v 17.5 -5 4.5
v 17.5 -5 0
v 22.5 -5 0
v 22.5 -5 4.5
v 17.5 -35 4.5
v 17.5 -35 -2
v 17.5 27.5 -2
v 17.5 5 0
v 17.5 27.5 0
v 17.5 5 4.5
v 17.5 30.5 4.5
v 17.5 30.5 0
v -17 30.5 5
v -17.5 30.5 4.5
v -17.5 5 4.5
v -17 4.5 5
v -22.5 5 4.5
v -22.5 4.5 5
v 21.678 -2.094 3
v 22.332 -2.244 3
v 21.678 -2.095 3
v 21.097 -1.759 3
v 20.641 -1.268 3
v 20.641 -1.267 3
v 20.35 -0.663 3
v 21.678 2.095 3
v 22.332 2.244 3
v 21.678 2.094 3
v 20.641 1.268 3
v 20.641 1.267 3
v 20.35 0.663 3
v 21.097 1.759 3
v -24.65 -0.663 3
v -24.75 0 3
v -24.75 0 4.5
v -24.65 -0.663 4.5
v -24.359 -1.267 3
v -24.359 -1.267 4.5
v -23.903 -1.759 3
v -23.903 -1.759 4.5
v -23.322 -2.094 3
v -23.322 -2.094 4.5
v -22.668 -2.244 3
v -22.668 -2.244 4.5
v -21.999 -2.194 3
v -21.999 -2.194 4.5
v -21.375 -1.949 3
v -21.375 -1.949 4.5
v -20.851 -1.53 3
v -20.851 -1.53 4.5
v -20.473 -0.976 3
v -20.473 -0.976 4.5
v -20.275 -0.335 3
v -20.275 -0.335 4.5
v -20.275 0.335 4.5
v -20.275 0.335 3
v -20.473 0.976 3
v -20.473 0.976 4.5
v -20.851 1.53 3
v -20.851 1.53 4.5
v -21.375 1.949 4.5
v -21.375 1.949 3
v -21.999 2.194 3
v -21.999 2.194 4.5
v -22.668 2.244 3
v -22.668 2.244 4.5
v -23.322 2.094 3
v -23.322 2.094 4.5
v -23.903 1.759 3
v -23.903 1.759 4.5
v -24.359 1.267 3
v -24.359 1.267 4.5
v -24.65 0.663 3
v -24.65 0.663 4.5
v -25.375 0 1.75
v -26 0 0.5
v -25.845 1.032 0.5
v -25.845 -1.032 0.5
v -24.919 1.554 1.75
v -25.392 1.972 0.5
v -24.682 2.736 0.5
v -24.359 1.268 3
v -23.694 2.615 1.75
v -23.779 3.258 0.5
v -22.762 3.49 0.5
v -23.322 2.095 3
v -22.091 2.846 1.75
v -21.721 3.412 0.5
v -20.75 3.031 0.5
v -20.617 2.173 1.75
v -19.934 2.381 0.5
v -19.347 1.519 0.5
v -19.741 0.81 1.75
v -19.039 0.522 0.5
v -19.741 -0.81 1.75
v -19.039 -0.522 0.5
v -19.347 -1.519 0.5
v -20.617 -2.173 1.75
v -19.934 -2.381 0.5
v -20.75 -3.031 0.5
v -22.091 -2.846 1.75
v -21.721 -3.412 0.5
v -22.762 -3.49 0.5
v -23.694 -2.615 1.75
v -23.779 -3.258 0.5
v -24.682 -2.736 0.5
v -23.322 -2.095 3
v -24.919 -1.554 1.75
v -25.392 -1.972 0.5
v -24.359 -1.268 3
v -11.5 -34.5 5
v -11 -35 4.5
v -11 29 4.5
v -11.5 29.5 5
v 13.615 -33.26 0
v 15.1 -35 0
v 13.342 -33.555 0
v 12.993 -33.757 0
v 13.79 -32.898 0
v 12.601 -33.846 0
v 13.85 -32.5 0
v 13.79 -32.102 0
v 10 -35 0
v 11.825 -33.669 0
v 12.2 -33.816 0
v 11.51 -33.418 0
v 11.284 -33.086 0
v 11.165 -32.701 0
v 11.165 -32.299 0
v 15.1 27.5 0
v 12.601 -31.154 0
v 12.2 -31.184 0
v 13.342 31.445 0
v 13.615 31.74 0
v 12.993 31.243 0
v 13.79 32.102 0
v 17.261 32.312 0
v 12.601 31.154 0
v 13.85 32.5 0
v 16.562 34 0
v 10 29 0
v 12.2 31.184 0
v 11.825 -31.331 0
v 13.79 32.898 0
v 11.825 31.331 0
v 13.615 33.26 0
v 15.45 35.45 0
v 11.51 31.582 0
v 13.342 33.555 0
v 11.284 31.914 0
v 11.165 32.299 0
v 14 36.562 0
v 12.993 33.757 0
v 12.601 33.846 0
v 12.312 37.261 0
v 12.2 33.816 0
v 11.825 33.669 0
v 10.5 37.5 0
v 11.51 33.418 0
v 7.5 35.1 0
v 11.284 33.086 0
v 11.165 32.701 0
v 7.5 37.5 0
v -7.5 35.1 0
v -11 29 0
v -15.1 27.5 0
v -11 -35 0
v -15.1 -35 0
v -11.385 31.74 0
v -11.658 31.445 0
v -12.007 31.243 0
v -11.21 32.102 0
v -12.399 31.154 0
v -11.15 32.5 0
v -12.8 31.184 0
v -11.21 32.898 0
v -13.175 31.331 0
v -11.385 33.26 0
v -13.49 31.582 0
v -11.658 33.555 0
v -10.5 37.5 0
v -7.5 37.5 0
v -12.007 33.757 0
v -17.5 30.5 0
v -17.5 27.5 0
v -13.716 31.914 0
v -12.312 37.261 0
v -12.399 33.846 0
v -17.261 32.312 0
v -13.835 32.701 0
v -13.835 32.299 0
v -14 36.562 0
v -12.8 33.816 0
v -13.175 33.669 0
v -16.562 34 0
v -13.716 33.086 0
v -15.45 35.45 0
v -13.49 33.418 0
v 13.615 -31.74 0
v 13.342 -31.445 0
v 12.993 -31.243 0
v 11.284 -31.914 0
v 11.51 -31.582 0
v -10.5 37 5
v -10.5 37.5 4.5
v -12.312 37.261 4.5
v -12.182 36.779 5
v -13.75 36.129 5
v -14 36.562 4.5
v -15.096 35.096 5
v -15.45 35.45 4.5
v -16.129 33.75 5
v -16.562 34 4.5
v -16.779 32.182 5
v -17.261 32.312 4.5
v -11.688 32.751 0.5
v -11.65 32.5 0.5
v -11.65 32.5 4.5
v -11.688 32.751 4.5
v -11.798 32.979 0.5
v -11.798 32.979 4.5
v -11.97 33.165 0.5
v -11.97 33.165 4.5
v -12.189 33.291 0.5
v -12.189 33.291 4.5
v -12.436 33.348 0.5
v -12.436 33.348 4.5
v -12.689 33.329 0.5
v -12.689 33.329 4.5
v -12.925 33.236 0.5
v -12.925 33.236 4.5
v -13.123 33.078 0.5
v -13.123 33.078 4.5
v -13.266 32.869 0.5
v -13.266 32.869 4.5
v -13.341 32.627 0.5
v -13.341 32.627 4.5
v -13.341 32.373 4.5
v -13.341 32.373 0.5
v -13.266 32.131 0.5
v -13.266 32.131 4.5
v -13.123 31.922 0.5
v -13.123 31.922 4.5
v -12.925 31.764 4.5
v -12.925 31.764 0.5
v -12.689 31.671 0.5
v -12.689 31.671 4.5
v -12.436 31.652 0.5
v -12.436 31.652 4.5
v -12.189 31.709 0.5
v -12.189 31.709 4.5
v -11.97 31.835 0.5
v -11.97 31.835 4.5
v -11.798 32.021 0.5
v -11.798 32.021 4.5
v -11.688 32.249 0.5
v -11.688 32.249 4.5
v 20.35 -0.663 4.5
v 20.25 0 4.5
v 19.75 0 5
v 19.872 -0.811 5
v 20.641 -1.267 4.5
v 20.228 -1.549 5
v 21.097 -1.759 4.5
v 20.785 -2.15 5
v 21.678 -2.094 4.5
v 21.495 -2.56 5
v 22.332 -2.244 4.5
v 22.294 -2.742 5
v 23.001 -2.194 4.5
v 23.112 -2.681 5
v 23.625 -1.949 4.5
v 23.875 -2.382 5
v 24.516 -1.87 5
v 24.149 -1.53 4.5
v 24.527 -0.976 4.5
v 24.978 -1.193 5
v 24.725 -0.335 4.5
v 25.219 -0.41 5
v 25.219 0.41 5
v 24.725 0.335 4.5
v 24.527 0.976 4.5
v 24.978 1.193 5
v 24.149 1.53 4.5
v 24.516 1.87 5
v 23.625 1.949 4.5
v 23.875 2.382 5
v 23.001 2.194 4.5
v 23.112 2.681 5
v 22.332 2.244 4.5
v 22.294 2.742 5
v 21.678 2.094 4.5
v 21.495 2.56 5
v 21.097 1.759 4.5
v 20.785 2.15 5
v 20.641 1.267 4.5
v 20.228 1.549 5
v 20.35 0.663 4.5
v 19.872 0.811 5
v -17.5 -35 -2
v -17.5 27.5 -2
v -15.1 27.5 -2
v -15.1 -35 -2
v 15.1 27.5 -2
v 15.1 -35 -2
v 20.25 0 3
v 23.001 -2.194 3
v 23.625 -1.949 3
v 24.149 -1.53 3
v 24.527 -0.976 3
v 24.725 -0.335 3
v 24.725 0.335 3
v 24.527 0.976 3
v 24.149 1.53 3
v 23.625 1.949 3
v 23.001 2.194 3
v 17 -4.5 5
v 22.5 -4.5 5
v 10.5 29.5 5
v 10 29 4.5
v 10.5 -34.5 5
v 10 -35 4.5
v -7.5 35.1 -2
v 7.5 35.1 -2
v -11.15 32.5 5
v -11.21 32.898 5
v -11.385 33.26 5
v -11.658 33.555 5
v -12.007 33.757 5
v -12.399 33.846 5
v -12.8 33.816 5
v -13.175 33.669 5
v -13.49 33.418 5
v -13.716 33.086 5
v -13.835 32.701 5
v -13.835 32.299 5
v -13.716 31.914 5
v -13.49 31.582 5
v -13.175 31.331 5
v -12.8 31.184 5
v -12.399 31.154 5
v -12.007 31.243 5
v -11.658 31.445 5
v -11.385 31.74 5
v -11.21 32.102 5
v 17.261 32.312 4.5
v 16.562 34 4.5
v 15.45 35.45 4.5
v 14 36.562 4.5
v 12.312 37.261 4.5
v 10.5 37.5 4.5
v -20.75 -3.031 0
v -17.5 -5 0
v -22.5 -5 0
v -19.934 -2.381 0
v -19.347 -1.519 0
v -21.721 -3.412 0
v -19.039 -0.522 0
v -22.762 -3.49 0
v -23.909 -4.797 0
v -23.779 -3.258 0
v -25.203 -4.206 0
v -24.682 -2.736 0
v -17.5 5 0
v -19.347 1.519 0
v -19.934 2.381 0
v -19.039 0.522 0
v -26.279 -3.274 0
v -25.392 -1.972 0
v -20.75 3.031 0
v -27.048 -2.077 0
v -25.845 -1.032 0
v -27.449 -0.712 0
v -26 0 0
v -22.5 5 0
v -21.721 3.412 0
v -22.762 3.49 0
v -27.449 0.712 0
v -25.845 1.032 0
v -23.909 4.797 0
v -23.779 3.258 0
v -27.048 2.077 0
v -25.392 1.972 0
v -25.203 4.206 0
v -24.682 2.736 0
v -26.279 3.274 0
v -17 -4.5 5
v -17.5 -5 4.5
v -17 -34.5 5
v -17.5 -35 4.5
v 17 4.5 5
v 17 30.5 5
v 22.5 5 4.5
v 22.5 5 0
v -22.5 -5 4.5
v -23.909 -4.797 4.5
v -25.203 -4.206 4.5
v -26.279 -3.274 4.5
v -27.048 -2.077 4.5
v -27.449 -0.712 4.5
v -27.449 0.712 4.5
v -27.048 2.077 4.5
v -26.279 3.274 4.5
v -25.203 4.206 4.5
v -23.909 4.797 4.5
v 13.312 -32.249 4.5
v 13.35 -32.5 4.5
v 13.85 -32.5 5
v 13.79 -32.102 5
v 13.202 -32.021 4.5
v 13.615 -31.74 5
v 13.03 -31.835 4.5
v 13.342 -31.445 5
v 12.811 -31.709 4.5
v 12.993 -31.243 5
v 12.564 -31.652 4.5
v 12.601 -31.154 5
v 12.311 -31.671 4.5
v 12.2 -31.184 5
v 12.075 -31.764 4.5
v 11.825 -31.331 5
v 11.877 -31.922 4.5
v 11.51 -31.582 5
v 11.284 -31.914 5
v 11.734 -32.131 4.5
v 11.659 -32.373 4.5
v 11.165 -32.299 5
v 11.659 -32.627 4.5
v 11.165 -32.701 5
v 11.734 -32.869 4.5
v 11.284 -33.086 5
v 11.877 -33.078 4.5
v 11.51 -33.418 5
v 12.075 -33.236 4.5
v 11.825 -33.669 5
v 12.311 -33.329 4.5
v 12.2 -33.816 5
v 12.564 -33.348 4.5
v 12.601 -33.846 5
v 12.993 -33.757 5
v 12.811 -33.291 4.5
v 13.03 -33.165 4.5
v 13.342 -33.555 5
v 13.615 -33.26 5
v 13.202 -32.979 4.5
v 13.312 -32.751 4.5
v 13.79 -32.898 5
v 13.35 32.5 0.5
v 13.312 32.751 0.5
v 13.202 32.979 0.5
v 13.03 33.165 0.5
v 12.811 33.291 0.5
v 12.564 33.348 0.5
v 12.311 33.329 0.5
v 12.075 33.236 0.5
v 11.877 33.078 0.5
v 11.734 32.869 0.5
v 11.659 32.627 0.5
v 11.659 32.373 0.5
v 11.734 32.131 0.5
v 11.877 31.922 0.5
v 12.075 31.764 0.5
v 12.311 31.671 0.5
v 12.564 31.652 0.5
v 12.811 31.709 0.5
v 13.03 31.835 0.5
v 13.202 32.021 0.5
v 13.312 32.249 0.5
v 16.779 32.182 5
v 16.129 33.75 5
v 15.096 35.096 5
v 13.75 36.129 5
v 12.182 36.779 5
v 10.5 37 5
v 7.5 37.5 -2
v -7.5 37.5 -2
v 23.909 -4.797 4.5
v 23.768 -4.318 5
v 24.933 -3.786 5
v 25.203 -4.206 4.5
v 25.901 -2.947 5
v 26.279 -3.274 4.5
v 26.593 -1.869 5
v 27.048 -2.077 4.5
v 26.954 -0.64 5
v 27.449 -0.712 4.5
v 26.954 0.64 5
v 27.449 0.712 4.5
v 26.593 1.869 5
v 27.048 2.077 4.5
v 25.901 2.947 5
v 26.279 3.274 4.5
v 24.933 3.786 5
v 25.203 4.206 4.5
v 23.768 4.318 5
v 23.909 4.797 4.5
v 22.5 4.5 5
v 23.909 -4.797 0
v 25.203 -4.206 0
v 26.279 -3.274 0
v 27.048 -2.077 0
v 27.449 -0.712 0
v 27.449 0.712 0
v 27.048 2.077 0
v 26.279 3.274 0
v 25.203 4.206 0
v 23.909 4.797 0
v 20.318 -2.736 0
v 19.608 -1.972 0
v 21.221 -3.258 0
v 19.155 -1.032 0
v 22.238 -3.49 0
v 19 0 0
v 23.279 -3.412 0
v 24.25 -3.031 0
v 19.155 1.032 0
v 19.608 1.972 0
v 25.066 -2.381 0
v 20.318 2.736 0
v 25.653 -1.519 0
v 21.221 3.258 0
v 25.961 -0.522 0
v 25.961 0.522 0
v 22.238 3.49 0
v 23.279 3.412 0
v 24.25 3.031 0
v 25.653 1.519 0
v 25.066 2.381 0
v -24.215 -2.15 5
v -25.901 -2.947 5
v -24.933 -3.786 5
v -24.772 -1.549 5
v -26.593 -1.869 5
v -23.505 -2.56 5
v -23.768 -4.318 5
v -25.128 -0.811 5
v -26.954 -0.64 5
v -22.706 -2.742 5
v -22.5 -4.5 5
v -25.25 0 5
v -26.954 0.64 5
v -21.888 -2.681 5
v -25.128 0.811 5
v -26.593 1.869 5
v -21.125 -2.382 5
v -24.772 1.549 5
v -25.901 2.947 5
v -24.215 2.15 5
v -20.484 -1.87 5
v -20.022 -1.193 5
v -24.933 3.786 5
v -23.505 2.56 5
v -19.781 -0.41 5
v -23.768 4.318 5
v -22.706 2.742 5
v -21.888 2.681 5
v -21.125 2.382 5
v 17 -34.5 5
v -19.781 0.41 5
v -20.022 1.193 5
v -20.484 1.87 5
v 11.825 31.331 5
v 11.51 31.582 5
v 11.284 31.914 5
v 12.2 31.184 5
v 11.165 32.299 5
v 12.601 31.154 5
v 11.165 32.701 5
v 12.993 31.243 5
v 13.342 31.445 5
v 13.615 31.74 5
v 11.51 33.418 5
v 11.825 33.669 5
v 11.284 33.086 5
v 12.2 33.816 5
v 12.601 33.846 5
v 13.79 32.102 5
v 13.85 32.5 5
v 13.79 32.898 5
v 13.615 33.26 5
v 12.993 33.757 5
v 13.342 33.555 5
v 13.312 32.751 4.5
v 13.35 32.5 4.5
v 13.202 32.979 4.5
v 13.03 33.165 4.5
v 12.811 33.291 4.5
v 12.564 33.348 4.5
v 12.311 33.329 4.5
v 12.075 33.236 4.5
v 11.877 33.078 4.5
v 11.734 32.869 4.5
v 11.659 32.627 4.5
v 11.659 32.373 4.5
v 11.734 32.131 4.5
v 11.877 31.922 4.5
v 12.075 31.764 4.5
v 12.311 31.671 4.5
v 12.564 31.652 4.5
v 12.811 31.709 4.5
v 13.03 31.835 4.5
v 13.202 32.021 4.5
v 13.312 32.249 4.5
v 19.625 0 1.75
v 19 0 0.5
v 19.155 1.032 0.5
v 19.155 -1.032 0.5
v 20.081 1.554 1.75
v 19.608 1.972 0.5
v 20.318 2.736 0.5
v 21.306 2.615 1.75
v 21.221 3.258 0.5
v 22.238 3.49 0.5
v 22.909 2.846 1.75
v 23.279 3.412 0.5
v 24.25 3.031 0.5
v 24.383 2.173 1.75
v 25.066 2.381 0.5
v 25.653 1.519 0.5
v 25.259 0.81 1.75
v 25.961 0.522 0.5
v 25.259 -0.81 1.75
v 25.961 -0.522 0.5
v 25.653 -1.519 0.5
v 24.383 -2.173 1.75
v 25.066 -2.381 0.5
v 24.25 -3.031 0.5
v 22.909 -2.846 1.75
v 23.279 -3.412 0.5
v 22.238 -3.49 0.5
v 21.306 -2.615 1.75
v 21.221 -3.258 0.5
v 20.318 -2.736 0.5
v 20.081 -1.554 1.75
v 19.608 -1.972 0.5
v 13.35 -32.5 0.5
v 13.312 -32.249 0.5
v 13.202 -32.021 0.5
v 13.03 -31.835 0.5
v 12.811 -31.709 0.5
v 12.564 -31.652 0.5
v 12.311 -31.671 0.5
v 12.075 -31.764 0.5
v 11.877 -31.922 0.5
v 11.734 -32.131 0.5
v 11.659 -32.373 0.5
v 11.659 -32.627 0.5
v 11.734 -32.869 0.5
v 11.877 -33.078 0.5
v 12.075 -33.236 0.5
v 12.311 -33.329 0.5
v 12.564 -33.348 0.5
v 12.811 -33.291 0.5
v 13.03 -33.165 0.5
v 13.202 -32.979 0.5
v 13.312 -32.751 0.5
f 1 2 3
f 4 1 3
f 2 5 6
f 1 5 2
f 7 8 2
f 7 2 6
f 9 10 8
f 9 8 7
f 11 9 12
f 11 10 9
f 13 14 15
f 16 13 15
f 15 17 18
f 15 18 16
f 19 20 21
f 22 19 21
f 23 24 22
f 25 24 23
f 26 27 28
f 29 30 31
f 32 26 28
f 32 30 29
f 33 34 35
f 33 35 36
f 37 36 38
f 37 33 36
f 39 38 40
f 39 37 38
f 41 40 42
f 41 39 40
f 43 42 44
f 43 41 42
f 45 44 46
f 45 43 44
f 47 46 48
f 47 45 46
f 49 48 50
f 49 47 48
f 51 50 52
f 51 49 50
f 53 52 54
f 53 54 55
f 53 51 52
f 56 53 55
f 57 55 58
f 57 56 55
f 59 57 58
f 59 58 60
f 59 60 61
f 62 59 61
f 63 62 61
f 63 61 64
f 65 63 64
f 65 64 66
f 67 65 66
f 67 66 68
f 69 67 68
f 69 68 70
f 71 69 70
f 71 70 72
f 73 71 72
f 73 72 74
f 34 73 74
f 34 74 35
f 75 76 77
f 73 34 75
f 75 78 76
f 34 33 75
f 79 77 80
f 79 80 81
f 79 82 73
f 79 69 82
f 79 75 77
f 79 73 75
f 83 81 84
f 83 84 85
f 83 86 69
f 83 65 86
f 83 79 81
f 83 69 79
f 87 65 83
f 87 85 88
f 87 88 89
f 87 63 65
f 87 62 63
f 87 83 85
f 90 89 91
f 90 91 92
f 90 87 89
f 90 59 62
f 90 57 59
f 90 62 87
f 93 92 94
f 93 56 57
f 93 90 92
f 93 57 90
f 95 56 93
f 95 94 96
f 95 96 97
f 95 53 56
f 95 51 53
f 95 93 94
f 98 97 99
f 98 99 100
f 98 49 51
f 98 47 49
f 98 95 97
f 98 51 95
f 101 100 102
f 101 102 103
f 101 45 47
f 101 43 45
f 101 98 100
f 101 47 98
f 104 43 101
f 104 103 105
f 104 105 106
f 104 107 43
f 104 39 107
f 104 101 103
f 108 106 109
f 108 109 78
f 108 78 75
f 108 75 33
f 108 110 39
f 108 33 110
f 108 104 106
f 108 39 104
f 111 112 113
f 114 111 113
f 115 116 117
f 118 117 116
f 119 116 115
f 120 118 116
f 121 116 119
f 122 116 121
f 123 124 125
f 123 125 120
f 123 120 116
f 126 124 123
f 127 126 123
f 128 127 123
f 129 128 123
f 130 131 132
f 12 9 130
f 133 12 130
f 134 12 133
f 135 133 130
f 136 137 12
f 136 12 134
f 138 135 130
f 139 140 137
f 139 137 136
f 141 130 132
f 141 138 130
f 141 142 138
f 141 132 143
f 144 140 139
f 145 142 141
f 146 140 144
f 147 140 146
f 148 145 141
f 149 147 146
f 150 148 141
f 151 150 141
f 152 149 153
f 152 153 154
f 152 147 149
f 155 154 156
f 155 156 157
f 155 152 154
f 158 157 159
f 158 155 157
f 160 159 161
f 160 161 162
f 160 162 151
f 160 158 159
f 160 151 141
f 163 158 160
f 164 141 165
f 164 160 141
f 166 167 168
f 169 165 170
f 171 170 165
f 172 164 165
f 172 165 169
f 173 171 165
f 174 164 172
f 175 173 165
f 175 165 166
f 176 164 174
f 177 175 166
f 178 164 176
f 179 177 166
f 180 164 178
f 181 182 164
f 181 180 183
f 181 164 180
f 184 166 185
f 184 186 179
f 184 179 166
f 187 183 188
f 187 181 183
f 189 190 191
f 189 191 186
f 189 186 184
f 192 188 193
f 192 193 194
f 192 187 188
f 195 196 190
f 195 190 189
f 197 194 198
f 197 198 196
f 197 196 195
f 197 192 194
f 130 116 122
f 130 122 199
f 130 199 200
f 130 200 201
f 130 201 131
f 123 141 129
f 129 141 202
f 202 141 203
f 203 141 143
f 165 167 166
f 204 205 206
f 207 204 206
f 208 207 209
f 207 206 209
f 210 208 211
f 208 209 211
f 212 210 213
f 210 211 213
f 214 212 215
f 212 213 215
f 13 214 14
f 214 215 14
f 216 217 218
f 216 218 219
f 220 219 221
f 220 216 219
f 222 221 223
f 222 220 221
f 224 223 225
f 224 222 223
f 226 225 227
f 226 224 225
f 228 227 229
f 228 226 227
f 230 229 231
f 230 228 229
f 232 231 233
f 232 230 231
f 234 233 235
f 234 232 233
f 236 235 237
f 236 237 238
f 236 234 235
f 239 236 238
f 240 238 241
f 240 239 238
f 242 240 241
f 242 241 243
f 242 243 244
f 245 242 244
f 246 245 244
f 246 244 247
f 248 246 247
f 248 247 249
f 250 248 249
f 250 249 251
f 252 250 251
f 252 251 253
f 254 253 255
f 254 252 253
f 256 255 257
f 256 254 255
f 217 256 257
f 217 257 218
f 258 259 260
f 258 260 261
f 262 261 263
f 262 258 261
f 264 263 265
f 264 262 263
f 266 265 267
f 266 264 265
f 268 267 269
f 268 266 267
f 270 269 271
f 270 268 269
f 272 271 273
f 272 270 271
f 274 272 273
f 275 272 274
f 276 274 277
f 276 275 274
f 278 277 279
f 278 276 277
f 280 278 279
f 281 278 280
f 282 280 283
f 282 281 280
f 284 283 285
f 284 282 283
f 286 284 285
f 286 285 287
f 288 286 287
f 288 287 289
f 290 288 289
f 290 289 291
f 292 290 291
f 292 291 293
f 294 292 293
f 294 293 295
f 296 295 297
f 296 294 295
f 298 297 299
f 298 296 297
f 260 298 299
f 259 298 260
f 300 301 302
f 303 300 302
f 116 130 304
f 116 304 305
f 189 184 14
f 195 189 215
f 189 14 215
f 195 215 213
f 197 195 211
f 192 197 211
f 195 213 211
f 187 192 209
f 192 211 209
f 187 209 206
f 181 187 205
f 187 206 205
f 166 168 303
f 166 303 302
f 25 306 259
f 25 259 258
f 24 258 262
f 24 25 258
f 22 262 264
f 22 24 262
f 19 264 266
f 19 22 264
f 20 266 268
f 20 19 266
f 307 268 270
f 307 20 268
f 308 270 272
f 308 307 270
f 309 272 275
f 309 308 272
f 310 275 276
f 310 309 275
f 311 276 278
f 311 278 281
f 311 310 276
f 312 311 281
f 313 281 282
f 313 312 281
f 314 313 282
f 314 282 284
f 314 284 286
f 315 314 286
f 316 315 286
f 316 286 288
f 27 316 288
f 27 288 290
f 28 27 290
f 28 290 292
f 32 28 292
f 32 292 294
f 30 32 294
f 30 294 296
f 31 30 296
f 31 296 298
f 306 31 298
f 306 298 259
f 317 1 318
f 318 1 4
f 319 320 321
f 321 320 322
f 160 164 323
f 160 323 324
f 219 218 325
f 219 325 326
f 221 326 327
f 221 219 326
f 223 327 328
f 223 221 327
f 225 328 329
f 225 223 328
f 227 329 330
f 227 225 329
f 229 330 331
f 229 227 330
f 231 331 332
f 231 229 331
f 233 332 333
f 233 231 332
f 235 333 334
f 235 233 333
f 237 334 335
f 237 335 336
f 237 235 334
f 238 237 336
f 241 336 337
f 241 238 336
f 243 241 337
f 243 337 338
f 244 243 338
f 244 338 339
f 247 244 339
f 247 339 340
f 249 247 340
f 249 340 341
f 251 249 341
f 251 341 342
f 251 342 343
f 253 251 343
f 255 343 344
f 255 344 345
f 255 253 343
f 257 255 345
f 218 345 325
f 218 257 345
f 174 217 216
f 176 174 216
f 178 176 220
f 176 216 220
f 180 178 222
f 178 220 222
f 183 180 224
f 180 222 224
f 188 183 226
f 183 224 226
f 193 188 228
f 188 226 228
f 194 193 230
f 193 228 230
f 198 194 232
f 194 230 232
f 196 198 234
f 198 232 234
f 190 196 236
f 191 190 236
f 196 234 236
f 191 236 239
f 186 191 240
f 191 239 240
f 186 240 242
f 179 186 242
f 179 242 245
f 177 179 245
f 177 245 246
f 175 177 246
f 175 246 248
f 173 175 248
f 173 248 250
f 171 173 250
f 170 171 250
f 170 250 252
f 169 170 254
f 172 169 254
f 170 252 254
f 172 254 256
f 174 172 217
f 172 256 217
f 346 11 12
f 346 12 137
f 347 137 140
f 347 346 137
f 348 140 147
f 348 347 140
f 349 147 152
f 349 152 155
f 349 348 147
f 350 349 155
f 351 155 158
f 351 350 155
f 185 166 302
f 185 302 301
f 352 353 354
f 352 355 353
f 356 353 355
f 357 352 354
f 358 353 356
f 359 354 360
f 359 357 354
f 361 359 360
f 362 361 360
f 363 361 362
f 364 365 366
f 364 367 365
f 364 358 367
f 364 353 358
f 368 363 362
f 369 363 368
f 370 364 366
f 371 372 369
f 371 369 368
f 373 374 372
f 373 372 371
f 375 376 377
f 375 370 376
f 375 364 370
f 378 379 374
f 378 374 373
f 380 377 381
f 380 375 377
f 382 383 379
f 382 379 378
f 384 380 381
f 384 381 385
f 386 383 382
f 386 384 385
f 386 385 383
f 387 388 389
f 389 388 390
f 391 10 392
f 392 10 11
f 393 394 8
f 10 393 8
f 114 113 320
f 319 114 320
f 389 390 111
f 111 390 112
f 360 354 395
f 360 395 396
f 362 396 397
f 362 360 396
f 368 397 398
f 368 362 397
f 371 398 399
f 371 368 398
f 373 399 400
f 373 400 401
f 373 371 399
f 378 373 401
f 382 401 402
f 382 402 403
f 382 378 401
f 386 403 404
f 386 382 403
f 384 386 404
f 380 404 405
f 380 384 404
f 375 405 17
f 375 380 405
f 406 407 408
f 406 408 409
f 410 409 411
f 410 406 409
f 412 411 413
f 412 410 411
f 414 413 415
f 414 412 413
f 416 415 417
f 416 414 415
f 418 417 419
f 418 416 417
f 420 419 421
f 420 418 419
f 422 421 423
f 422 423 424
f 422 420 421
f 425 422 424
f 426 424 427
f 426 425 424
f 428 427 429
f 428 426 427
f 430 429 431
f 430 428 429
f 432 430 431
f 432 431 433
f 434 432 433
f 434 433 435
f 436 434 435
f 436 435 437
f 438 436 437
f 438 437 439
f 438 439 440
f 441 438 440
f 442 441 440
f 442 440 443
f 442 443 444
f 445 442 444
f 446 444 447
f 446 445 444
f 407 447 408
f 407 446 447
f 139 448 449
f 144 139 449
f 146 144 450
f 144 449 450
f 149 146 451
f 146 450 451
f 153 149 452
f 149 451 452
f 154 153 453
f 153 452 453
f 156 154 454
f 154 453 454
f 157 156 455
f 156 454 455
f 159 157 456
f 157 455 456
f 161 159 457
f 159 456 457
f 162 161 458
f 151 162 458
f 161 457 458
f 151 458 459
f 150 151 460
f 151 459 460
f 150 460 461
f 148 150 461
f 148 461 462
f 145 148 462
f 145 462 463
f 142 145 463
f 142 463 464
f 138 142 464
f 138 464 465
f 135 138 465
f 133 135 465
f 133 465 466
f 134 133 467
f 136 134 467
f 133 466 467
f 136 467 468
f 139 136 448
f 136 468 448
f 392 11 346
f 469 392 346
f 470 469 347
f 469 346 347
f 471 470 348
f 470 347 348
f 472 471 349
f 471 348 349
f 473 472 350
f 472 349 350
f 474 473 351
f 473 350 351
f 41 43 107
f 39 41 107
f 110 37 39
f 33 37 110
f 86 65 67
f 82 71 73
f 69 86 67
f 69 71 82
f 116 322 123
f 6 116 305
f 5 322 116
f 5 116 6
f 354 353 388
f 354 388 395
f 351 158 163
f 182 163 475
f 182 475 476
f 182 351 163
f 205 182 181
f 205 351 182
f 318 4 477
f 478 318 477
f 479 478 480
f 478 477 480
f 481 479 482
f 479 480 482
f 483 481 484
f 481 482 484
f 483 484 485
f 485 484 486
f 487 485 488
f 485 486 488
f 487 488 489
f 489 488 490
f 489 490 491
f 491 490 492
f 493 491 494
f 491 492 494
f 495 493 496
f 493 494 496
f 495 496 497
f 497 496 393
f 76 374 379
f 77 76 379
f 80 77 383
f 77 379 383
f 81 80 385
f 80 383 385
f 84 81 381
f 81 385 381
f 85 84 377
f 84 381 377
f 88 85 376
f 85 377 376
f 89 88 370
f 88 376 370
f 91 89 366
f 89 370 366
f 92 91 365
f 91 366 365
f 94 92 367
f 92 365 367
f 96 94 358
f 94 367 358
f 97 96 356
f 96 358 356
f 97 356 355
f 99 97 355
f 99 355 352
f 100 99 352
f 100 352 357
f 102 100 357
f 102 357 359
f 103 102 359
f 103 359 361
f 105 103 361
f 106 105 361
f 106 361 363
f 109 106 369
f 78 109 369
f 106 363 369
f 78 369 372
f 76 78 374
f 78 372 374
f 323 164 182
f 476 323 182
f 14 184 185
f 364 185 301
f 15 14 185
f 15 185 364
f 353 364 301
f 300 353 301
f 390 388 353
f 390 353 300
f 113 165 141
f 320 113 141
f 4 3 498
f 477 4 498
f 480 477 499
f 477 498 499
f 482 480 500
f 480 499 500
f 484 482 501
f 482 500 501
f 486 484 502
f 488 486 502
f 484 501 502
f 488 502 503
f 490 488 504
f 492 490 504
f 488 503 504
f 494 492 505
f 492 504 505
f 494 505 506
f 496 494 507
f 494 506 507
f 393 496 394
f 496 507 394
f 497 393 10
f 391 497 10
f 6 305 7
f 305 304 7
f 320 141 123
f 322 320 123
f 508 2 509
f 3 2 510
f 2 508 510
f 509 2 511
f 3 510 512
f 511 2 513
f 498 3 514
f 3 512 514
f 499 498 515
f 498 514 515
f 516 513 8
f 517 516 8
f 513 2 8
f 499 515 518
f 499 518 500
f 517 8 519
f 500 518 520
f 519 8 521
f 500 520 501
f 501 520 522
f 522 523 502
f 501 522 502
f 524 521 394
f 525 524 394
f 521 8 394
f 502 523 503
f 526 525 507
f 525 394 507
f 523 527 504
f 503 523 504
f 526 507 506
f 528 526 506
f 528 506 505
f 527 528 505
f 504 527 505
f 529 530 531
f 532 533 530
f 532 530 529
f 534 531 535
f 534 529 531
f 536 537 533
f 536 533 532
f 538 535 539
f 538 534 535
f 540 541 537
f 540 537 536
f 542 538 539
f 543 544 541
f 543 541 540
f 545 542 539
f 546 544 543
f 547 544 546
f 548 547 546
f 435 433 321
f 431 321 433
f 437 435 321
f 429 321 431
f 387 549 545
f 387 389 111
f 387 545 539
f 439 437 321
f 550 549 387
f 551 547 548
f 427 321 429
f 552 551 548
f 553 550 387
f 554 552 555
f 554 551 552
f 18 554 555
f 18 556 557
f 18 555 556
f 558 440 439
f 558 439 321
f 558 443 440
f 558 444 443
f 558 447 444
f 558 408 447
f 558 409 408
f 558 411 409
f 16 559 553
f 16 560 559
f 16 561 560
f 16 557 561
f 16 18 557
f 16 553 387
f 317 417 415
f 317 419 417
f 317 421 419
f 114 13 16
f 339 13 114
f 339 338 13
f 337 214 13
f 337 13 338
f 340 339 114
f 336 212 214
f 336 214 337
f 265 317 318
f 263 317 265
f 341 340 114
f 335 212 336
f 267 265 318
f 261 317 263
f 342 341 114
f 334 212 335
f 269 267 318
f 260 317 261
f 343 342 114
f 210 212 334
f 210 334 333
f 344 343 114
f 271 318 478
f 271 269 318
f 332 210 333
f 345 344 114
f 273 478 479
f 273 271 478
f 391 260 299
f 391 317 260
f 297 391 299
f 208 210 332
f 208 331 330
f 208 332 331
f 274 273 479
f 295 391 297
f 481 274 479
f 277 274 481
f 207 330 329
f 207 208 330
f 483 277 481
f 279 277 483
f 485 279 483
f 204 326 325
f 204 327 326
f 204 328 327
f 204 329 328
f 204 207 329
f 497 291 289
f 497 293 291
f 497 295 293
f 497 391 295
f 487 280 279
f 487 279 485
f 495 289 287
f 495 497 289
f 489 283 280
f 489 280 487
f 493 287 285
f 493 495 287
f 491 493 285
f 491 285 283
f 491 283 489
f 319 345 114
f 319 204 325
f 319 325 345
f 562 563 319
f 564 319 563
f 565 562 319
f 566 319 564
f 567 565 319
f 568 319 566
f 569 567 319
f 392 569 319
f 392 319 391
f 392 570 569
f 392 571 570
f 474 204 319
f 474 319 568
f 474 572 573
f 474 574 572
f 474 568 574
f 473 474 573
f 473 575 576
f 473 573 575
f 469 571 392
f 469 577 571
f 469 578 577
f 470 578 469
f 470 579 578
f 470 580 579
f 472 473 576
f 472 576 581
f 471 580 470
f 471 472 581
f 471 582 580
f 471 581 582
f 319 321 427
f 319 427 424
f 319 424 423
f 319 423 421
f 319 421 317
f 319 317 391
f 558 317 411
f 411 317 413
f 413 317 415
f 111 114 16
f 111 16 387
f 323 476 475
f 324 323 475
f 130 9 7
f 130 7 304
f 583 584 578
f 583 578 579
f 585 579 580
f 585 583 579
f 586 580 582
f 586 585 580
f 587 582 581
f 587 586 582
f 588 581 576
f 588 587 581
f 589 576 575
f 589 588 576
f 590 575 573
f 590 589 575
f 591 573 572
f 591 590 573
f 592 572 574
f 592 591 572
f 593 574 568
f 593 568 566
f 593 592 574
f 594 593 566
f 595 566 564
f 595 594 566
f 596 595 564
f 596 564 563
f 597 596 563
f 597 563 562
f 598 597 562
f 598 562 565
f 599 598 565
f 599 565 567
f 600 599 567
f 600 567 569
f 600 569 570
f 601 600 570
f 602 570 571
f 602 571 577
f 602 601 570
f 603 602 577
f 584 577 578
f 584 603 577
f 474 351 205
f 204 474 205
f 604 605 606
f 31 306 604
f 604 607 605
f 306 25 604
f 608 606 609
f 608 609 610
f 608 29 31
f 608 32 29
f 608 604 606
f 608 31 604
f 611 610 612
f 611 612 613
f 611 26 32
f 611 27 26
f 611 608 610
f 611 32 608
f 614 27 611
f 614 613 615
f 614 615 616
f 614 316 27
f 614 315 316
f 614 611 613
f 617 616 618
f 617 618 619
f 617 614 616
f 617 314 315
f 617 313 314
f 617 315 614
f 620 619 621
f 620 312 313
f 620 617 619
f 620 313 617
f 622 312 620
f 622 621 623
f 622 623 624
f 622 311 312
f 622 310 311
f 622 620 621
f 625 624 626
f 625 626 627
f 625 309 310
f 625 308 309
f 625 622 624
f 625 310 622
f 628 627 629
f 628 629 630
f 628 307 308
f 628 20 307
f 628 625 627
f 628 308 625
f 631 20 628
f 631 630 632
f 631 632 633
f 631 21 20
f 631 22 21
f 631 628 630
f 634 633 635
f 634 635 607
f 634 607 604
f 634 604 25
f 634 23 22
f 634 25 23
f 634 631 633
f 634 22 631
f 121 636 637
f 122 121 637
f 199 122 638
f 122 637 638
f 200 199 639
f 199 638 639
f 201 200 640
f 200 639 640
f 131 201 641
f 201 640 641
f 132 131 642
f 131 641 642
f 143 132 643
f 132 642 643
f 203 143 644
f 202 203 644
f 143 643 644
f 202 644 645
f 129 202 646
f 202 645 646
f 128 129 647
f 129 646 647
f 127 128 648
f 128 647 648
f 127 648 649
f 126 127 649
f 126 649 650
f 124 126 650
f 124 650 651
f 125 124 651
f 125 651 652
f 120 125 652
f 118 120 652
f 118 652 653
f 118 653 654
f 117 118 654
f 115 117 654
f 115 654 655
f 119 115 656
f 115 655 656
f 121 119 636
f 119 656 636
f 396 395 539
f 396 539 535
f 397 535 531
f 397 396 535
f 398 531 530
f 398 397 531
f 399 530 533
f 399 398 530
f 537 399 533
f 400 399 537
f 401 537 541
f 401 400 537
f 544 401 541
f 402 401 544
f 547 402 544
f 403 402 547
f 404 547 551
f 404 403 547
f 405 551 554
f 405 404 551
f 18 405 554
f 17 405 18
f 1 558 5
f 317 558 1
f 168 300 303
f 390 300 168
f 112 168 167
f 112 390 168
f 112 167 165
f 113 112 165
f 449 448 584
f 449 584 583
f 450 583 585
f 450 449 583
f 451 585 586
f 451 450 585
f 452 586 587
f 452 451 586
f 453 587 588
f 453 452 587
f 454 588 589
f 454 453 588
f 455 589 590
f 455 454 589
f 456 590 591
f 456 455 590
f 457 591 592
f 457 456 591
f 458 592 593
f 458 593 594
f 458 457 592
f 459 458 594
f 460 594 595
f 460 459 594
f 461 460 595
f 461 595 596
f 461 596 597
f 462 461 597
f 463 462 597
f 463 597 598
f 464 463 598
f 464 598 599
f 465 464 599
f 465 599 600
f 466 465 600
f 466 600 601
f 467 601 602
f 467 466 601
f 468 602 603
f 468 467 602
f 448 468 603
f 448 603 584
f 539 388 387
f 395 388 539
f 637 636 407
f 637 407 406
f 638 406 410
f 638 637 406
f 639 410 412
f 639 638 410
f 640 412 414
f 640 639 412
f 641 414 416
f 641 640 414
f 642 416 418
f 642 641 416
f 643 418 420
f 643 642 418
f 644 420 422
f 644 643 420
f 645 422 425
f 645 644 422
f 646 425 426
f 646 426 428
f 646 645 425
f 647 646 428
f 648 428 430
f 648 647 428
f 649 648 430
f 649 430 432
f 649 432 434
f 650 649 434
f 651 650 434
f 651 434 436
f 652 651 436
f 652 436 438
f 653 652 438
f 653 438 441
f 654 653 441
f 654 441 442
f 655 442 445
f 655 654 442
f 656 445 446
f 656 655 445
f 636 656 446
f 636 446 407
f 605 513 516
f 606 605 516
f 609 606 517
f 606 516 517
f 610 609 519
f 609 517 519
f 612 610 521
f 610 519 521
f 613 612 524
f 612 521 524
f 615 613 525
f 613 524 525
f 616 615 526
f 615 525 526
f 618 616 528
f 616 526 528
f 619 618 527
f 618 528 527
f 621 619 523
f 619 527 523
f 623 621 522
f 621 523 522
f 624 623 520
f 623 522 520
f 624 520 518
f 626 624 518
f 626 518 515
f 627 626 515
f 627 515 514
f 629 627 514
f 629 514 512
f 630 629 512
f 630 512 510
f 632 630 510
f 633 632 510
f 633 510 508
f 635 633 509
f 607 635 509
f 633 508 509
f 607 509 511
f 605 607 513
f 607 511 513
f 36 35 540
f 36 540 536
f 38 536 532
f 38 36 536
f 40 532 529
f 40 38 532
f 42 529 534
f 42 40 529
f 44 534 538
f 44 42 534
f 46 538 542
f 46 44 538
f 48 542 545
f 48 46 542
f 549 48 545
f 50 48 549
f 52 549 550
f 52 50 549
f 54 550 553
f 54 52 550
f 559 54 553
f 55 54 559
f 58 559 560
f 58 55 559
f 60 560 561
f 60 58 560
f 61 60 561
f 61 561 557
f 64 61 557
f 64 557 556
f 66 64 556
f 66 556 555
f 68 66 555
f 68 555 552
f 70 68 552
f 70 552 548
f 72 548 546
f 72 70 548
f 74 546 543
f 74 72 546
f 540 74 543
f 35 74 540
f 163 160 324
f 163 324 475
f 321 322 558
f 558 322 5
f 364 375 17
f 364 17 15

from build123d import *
from OCP.BRepFilletAPI import BRepFilletAPI_MakeChamfer

# Parameters (mm, degrees)
SKETCH1_R           = 0.85
BOSS_EXTRUDE1_DEPTH = 5
BOSS_EXTRUDE2_DEPTH = 2
SKETCH3_R           = 2.25
BOSS_EXTRUDE3_DEPTH = 5
SKETCH4_R           = 3.5
CUT_EXTRUDE1_DEPTH  = 3
SKETCH5_W           = 10
SKETCH5_H           = 10
CUT_EXTRUDE2_DEPTH  = 47.770717335
FILLET1_R           = 7
CHAMFER3_SIZE       = 0.5
CHAMFER1_SIZE       = 2.5
CHAMFER1_SIZE_2     = 1.25


with BuildPart() as part:
    # Sketch1 → Boss-Extrude1 (new body)
    with BuildSketch(Plane.XY):
        Polygon((-11, -35), (-11, 29), (10, 29), (10, -35), (17.5, -35), (17.5, 37.5), (-17.5, 37.5), (-17.5, -35), align=None)
        with Locations((-12.5, 32.5)):
            Circle(SKETCH1_R, mode=Mode.SUBTRACT)
        with Locations((12.5, 32.5)):
            Circle(SKETCH1_R, mode=Mode.SUBTRACT)
        with Locations((12.5, -32.5)):
            Circle(SKETCH1_R, mode=Mode.SUBTRACT)
    extrude(amount=BOSS_EXTRUDE1_DEPTH)

    # Sketch2 → Boss-Extrude2 (add)
    with BuildSketch(Plane.XY):
        Polygon((17.5, -35), (17.5, 37.5), (-17.5, 37.5), (-17.5, -35), (-15.1, -35), (-15.1, 35.1), (15.1, 35.1), (15.1, -35), align=None)
    extrude(amount=-BOSS_EXTRUDE2_DEPTH)

    # Sketch3 → Boss-Extrude3 (add)
    # profile 1 of 2: a face of its own
    with BuildSketch(Plane.XY):
        with BuildLine():
            Line((22.5, 5), (17.5, 5))
            Line((17.5, 5), (17.5, -5))
            Line((17.5, -5), (22.5, -5))
            ThreePointArc((22.5, -5), (27.5, 0), (22.5, 5))
        make_face()
        with Locations(Location((22.5, 0, 0), (0, 0, 180))):
            Circle(SKETCH3_R, mode=Mode.SUBTRACT)
    # profile 2 of 2: a face of its own
    with BuildSketch(Plane.XY):
        with BuildLine():
            Line((-22.5, 5), (-17.5, 5))
            Line((-17.5, 5), (-17.5, -5))
            Line((-17.5, -5), (-22.5, -5))
            ThreePointArc((-22.5, -5), (-27.5, 0), (-22.5, 5))
        make_face()
        with Locations(Location((-22.5, 0, 0), (0, 0, 180))):
            Circle(SKETCH3_R, mode=Mode.SUBTRACT)
    extrude(amount=BOSS_EXTRUDE3_DEPTH)

    # Sketch4 → Cut-Extrude1 (cut)
    with BuildSketch(Plane(origin=(0, 0, 0), x_dir=(-1, 0, 0), z_dir=(0, 0, -1))):
        with Locations((-22.5, 0)):
            Circle(SKETCH4_R)
        with Locations((22.5, 0)):
            Circle(SKETCH4_R)
    extrude(amount=-CUT_EXTRUDE1_DEPTH, mode=Mode.SUBTRACT)

    # Sketch5 → Cut-Extrude2 (cut, through all)
    with BuildSketch(Plane(origin=(0, 0, 0), x_dir=(-1, 0, 0), z_dir=(0, 0, -1))):
        with Locations((-12.5, 32.5)):
            Rectangle(SKETCH5_W, SKETCH5_H)
        with Locations((12.5, 32.5)):
            Rectangle(SKETCH5_W, SKETCH5_H)
    extrude(amount=CUT_EXTRUDE2_DEPTH, mode=Mode.SUBTRACT)

    # Fillet1
    fillet1_edges = [part.edges().sort_by_distance(p)[0] for p in [
        (-17.5, 37.5, 2.5),
        (17.5, 37.5, 2.5),
    ]]
    fillet(fillet1_edges, radius=FILLET1_R)

    # Chamfer3
    chamfer3_edges = [part.edges().sort_by_distance(p)[0] for p in [
        (-0.5, 29, 5),
        (-17.5, 17.75, 5),
        (0, 37.5, 5),
        (15.449747468, 35.449747468, 5),
        (-15.449747468, 35.449747468, 5),
        (10, -3, 5),
        (13.75, -35, 5),
        (-13.35, 32.5, 0),
        (-13.35, 32.5, 5),
        (17.5, -20, 5),
        (11.65, 32.5, 0),
        (11.65, 32.5, 5),
        (11.65, -32.5, 0),
        (11.65, -32.5, 5),
        (-14.25, -35, 5),
        (17.5, 17.75, 5),
        (27.5, 0, 5),
        (20, 5, 5),
        (20, -5, 5),
        (24.75, 0, 5),
        (-17.5, -20, 5),
        (-27.5, 0, 5),
        (-20, -5, 5),
        (-20, 5, 5),
        (-20.25, 0, 5),
        (-11, -3, 5),
    ]]
    chamfer(chamfer3_edges, length=CHAMFER3_SIZE)

    # Chamfer1
    chamfer1_edges_1 = [part.edges().sort_by_distance(p)[0] for p in [
        (26, 0, 3),
    ]]
    chamfer1_side_1 = [part.faces().sort_by_distance(p)[0] for p in [
        (26, 0, 2.975),
    ]]
    chamfer1_edges_2 = [part.edges().sort_by_distance(p)[0] for p in [
        (-19, 0, 3),
    ]]
    chamfer1_side_2 = [part.faces().sort_by_distance(p)[0] for p in [
        (-19, 0, 2.975),
    ]]
    chamfer1 = BRepFilletAPI_MakeChamfer(part.part.solid().wrapped)
    for e in chamfer1_edges_1:
        chamfer1.Add(CHAMFER1_SIZE - 0.0001, CHAMFER1_SIZE_2 - 0.0001, e.wrapped, chamfer1_side_1[0].wrapped)
    for e in chamfer1_edges_2:
        chamfer1.Add(CHAMFER1_SIZE - 0.0001, CHAMFER1_SIZE_2 - 0.0001, e.wrapped, chamfer1_side_2[0].wrapped)
    add(Compound.cast(chamfer1.Shape()), mode=Mode.REPLACE)  # a hair under: the kernel refuses the full size


solid = part.part
